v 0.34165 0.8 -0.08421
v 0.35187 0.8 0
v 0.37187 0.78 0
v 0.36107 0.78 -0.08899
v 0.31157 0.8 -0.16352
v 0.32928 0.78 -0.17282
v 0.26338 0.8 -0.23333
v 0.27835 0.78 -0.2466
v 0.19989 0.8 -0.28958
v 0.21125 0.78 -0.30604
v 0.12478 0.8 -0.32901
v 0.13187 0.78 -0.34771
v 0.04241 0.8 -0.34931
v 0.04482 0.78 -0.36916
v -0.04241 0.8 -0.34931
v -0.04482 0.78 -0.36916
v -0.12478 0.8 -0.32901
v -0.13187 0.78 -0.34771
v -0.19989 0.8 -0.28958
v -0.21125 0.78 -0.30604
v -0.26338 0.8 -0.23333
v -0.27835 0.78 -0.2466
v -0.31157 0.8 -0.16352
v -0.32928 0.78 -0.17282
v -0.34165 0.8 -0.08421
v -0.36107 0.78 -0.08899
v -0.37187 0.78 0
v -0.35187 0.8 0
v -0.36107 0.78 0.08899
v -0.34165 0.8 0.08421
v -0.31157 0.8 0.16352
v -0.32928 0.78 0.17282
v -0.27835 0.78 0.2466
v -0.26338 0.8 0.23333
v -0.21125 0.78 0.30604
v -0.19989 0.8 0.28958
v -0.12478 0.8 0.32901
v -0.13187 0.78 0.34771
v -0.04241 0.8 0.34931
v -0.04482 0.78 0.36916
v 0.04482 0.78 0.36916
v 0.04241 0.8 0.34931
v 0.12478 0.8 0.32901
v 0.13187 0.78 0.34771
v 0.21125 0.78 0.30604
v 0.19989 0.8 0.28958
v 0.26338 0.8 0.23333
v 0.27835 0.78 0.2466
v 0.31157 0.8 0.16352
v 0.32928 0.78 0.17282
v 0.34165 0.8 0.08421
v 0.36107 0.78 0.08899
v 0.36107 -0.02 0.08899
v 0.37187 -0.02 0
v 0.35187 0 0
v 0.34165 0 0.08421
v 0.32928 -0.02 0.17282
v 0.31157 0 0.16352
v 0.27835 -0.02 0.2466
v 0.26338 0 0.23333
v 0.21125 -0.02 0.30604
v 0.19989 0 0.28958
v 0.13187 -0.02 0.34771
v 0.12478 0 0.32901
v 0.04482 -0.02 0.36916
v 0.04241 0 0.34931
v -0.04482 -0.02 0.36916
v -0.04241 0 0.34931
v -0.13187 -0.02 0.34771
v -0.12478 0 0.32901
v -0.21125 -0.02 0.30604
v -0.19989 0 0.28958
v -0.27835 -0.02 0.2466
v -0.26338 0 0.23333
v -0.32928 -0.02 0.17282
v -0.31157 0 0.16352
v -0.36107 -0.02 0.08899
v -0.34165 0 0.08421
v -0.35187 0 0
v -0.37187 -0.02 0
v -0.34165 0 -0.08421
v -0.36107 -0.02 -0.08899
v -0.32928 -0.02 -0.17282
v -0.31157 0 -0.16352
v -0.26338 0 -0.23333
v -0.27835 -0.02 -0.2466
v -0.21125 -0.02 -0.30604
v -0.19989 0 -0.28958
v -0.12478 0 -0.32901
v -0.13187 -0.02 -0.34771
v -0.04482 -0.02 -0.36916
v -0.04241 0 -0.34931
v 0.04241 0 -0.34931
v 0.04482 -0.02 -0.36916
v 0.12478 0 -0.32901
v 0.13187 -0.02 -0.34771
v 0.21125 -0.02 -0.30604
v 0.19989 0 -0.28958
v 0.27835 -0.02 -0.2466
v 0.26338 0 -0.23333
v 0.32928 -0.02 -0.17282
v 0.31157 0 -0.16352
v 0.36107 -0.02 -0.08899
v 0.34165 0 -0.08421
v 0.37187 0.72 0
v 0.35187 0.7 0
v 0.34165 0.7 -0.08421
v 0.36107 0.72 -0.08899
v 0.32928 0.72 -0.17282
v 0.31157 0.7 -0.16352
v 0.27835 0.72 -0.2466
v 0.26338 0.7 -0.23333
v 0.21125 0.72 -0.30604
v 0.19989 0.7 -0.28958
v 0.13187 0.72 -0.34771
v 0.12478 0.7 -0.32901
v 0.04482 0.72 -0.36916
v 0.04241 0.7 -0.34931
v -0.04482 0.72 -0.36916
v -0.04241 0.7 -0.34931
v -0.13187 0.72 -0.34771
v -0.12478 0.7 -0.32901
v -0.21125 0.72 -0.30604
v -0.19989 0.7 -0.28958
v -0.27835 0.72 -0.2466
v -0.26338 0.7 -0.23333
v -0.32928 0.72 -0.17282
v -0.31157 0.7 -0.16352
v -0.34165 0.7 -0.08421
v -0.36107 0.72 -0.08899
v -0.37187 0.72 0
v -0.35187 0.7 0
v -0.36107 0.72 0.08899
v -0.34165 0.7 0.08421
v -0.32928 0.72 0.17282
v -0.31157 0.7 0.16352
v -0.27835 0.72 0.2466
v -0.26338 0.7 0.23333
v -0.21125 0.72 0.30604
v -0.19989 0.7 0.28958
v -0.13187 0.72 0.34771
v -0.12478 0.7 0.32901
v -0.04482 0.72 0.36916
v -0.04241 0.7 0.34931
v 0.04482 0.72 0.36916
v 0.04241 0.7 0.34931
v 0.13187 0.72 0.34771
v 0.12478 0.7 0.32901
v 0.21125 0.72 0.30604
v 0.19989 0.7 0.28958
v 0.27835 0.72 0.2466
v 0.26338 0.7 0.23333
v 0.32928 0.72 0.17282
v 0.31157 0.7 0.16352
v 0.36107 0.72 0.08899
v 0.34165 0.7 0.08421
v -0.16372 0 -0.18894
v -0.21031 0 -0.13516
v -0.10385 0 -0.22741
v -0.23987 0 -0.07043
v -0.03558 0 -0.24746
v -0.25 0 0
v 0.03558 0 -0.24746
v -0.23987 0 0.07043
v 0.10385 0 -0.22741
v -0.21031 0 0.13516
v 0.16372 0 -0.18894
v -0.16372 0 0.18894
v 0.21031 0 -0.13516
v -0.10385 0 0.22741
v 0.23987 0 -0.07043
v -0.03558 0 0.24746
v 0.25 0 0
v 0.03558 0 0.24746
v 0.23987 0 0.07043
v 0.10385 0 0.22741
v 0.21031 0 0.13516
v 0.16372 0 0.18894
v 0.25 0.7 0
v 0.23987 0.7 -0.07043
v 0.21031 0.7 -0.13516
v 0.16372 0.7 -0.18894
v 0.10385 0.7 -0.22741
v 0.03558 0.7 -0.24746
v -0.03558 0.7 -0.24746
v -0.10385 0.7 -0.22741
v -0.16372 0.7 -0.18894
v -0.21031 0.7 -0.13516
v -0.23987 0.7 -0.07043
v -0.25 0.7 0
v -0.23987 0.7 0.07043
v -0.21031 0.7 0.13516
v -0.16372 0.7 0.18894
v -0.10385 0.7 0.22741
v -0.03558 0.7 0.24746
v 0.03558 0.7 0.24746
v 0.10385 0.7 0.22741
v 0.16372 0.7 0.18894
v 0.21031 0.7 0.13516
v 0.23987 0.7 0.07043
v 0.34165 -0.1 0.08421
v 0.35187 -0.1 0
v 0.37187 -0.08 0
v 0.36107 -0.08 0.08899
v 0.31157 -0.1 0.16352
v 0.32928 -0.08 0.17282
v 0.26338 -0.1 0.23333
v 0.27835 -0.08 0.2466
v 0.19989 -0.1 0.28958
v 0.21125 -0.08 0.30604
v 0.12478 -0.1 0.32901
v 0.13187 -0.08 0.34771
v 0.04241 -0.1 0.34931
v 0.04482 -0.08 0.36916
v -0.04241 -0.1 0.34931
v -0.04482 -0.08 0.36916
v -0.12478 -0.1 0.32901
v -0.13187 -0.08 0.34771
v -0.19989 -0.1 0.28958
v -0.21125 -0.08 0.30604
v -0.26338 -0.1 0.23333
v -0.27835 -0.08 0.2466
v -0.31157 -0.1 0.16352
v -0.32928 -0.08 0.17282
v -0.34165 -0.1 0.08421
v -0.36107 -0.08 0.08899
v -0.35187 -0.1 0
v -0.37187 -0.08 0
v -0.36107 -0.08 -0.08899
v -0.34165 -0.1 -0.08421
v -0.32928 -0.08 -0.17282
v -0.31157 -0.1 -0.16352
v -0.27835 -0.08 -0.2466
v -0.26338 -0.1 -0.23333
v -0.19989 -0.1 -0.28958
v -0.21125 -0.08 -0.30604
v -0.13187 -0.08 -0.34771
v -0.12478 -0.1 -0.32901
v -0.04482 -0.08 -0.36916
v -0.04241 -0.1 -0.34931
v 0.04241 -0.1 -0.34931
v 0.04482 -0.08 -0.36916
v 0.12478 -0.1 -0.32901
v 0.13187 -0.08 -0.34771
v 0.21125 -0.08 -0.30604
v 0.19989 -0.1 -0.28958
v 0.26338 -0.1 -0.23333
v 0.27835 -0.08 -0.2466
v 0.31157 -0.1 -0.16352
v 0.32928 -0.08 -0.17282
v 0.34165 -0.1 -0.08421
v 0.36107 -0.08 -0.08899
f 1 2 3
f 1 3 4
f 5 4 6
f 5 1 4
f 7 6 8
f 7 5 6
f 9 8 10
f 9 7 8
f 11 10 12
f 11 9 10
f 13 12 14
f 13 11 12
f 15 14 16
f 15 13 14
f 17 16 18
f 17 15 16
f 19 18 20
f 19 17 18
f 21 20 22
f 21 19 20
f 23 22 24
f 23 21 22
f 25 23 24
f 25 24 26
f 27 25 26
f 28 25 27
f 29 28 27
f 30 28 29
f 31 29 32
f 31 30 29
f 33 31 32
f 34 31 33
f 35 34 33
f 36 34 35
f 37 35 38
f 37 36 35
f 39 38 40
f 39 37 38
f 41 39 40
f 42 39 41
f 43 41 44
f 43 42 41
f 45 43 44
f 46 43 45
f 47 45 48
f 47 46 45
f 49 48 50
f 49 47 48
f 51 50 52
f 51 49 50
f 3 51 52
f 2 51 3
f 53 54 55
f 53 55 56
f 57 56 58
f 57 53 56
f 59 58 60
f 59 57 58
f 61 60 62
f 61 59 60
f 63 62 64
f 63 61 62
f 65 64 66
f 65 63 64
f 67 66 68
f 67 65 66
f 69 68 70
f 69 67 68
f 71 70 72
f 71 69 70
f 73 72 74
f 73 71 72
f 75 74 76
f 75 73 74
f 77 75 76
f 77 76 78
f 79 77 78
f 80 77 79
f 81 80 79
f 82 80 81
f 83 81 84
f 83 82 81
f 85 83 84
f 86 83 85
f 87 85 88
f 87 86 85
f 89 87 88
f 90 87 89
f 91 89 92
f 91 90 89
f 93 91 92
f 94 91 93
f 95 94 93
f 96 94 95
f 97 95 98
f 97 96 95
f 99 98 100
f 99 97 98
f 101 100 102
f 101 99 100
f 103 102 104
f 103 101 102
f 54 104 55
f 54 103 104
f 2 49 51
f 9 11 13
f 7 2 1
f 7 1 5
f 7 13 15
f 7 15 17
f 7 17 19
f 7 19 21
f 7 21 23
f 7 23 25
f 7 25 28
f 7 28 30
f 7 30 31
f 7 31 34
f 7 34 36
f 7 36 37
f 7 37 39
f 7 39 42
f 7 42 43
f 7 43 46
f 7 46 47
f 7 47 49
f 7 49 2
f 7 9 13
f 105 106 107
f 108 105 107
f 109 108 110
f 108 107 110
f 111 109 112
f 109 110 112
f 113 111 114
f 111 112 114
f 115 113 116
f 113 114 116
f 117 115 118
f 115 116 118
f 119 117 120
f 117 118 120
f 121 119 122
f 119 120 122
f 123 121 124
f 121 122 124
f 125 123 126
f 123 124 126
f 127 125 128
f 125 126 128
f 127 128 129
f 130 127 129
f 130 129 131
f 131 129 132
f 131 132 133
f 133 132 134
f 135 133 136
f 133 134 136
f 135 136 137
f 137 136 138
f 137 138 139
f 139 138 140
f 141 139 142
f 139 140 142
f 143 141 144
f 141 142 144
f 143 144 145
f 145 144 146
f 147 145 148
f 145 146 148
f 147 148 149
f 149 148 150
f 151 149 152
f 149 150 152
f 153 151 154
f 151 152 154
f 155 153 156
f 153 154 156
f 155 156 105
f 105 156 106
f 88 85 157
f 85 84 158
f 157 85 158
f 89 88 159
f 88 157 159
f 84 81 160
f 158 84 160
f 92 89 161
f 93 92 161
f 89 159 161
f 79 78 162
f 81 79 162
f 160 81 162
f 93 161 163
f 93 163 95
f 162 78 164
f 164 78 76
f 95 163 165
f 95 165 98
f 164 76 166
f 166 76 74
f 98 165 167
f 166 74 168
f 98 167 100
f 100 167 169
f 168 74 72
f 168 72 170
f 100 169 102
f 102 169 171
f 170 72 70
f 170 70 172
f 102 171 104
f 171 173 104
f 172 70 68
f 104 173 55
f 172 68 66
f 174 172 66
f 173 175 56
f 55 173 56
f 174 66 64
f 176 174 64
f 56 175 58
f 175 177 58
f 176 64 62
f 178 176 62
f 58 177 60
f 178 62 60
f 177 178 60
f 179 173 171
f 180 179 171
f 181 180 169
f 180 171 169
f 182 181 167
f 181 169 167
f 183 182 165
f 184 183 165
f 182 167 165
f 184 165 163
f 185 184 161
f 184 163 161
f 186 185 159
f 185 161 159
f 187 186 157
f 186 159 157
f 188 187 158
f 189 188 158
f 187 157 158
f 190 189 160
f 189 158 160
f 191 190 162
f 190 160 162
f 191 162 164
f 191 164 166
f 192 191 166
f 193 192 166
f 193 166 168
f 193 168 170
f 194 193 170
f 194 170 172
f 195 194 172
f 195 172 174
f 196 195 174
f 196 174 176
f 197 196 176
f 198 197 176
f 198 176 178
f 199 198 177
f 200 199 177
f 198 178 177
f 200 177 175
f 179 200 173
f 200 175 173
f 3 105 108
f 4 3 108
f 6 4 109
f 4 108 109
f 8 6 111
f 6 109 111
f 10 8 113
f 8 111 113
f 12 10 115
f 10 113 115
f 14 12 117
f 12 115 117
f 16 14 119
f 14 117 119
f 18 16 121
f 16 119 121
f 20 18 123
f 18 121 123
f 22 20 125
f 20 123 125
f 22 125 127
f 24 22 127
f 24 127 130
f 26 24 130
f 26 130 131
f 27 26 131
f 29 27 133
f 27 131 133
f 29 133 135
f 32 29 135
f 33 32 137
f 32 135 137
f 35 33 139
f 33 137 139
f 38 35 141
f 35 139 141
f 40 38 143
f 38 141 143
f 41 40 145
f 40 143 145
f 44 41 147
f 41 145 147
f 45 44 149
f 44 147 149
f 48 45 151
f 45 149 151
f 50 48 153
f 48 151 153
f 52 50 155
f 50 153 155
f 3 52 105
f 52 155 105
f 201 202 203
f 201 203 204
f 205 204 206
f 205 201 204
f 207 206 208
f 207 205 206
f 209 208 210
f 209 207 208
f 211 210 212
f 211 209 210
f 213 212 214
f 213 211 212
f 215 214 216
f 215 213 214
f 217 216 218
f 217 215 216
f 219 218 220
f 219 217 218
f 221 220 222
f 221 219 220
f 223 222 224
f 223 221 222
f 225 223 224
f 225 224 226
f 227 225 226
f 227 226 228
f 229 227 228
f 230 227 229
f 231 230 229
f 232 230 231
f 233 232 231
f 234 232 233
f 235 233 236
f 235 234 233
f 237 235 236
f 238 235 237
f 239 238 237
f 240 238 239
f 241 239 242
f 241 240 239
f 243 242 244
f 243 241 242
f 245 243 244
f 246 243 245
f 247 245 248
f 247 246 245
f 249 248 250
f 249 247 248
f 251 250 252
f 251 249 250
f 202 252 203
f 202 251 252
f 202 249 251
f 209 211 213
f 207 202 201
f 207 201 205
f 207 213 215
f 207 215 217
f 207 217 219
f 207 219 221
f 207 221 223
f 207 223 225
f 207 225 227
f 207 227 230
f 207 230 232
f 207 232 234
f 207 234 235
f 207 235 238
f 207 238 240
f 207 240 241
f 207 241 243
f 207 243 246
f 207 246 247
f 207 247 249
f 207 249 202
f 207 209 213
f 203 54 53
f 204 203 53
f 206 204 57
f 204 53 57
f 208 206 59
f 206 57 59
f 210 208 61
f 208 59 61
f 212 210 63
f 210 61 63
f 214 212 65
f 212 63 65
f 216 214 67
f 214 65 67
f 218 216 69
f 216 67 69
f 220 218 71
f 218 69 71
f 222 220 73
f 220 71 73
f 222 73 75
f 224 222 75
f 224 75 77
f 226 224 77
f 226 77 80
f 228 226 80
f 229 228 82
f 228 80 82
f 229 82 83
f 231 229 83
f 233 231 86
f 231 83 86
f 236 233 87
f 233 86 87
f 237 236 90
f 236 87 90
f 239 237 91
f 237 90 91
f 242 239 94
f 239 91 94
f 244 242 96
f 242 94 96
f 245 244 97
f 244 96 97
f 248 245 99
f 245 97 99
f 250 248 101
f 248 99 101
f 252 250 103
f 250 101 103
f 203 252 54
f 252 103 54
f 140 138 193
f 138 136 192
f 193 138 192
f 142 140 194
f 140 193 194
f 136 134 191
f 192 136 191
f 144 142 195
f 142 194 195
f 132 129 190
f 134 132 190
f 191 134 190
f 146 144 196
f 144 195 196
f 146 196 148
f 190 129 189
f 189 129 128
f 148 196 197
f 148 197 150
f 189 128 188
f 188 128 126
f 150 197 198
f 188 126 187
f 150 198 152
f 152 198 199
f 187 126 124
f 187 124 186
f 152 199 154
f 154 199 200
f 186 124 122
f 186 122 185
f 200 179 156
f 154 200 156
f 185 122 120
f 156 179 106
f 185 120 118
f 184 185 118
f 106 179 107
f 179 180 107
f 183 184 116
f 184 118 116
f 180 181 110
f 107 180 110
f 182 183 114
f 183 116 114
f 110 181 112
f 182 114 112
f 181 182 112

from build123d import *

# Parameters (mm, degrees)
SKETCH2_R           = 0.25
BOSS_EXTRUDE1_DEPTH = 0.7
SKETCH3_R           = 0.371871199
BOSS_EXTRUDE2_DEPTH = 0.1
SKETCH4_R           = 0.371871199
BOSS_EXTRUDE3_DEPTH = 0.1
CHAMFER1_SIZE       = 0.02
CHAMFER2_SIZE       = 0.02
CHAMFER3_SIZE       = 0.02


with BuildPart() as part:
    # Sketch2 → Boss-Extrude1 (new body)
    with BuildSketch(Plane(origin=(0, 0, 0), x_dir=(1, 0, 0), z_dir=(0, 1, 0))):
        Circle(SKETCH2_R)
    extrude(amount=BOSS_EXTRUDE1_DEPTH)

    # Sketch3 → Boss-Extrude2 (add)
    with BuildSketch(Plane(origin=(0, 0.7, 0), x_dir=(1, 0, 0), z_dir=(0, 1, 0))):
        Circle(SKETCH3_R)
    extrude(amount=BOSS_EXTRUDE2_DEPTH)

    # Sketch4 → Boss-Extrude3 (add)
    with BuildSketch(Plane.XZ):
        Circle(SKETCH4_R)
    extrude(amount=BOSS_EXTRUDE3_DEPTH)

    # Chamfer1
    chamfer1_edges = [part.edges().sort_by_distance(p)[0] for p in [
        (-0.371871199, 0.8, 0),
    ]]
    chamfer(chamfer1_edges, length=CHAMFER1_SIZE)

    # Chamfer2
    chamfer2_edges = [part.edges().sort_by_distance(p)[0] for p in [
        (-0.371871199, 0.7, 0),
        (-0.371871199, 0, 0),
    ]]
    chamfer(chamfer2_edges, length=CHAMFER2_SIZE)

    # Chamfer3
    chamfer3_edges = [part.edges().sort_by_distance(p)[0] for p in [
        (-0.371871199, -0.1, 0),
    ]]
    chamfer(chamfer3_edges, length=CHAMFER3_SIZE)


solid = part.part
